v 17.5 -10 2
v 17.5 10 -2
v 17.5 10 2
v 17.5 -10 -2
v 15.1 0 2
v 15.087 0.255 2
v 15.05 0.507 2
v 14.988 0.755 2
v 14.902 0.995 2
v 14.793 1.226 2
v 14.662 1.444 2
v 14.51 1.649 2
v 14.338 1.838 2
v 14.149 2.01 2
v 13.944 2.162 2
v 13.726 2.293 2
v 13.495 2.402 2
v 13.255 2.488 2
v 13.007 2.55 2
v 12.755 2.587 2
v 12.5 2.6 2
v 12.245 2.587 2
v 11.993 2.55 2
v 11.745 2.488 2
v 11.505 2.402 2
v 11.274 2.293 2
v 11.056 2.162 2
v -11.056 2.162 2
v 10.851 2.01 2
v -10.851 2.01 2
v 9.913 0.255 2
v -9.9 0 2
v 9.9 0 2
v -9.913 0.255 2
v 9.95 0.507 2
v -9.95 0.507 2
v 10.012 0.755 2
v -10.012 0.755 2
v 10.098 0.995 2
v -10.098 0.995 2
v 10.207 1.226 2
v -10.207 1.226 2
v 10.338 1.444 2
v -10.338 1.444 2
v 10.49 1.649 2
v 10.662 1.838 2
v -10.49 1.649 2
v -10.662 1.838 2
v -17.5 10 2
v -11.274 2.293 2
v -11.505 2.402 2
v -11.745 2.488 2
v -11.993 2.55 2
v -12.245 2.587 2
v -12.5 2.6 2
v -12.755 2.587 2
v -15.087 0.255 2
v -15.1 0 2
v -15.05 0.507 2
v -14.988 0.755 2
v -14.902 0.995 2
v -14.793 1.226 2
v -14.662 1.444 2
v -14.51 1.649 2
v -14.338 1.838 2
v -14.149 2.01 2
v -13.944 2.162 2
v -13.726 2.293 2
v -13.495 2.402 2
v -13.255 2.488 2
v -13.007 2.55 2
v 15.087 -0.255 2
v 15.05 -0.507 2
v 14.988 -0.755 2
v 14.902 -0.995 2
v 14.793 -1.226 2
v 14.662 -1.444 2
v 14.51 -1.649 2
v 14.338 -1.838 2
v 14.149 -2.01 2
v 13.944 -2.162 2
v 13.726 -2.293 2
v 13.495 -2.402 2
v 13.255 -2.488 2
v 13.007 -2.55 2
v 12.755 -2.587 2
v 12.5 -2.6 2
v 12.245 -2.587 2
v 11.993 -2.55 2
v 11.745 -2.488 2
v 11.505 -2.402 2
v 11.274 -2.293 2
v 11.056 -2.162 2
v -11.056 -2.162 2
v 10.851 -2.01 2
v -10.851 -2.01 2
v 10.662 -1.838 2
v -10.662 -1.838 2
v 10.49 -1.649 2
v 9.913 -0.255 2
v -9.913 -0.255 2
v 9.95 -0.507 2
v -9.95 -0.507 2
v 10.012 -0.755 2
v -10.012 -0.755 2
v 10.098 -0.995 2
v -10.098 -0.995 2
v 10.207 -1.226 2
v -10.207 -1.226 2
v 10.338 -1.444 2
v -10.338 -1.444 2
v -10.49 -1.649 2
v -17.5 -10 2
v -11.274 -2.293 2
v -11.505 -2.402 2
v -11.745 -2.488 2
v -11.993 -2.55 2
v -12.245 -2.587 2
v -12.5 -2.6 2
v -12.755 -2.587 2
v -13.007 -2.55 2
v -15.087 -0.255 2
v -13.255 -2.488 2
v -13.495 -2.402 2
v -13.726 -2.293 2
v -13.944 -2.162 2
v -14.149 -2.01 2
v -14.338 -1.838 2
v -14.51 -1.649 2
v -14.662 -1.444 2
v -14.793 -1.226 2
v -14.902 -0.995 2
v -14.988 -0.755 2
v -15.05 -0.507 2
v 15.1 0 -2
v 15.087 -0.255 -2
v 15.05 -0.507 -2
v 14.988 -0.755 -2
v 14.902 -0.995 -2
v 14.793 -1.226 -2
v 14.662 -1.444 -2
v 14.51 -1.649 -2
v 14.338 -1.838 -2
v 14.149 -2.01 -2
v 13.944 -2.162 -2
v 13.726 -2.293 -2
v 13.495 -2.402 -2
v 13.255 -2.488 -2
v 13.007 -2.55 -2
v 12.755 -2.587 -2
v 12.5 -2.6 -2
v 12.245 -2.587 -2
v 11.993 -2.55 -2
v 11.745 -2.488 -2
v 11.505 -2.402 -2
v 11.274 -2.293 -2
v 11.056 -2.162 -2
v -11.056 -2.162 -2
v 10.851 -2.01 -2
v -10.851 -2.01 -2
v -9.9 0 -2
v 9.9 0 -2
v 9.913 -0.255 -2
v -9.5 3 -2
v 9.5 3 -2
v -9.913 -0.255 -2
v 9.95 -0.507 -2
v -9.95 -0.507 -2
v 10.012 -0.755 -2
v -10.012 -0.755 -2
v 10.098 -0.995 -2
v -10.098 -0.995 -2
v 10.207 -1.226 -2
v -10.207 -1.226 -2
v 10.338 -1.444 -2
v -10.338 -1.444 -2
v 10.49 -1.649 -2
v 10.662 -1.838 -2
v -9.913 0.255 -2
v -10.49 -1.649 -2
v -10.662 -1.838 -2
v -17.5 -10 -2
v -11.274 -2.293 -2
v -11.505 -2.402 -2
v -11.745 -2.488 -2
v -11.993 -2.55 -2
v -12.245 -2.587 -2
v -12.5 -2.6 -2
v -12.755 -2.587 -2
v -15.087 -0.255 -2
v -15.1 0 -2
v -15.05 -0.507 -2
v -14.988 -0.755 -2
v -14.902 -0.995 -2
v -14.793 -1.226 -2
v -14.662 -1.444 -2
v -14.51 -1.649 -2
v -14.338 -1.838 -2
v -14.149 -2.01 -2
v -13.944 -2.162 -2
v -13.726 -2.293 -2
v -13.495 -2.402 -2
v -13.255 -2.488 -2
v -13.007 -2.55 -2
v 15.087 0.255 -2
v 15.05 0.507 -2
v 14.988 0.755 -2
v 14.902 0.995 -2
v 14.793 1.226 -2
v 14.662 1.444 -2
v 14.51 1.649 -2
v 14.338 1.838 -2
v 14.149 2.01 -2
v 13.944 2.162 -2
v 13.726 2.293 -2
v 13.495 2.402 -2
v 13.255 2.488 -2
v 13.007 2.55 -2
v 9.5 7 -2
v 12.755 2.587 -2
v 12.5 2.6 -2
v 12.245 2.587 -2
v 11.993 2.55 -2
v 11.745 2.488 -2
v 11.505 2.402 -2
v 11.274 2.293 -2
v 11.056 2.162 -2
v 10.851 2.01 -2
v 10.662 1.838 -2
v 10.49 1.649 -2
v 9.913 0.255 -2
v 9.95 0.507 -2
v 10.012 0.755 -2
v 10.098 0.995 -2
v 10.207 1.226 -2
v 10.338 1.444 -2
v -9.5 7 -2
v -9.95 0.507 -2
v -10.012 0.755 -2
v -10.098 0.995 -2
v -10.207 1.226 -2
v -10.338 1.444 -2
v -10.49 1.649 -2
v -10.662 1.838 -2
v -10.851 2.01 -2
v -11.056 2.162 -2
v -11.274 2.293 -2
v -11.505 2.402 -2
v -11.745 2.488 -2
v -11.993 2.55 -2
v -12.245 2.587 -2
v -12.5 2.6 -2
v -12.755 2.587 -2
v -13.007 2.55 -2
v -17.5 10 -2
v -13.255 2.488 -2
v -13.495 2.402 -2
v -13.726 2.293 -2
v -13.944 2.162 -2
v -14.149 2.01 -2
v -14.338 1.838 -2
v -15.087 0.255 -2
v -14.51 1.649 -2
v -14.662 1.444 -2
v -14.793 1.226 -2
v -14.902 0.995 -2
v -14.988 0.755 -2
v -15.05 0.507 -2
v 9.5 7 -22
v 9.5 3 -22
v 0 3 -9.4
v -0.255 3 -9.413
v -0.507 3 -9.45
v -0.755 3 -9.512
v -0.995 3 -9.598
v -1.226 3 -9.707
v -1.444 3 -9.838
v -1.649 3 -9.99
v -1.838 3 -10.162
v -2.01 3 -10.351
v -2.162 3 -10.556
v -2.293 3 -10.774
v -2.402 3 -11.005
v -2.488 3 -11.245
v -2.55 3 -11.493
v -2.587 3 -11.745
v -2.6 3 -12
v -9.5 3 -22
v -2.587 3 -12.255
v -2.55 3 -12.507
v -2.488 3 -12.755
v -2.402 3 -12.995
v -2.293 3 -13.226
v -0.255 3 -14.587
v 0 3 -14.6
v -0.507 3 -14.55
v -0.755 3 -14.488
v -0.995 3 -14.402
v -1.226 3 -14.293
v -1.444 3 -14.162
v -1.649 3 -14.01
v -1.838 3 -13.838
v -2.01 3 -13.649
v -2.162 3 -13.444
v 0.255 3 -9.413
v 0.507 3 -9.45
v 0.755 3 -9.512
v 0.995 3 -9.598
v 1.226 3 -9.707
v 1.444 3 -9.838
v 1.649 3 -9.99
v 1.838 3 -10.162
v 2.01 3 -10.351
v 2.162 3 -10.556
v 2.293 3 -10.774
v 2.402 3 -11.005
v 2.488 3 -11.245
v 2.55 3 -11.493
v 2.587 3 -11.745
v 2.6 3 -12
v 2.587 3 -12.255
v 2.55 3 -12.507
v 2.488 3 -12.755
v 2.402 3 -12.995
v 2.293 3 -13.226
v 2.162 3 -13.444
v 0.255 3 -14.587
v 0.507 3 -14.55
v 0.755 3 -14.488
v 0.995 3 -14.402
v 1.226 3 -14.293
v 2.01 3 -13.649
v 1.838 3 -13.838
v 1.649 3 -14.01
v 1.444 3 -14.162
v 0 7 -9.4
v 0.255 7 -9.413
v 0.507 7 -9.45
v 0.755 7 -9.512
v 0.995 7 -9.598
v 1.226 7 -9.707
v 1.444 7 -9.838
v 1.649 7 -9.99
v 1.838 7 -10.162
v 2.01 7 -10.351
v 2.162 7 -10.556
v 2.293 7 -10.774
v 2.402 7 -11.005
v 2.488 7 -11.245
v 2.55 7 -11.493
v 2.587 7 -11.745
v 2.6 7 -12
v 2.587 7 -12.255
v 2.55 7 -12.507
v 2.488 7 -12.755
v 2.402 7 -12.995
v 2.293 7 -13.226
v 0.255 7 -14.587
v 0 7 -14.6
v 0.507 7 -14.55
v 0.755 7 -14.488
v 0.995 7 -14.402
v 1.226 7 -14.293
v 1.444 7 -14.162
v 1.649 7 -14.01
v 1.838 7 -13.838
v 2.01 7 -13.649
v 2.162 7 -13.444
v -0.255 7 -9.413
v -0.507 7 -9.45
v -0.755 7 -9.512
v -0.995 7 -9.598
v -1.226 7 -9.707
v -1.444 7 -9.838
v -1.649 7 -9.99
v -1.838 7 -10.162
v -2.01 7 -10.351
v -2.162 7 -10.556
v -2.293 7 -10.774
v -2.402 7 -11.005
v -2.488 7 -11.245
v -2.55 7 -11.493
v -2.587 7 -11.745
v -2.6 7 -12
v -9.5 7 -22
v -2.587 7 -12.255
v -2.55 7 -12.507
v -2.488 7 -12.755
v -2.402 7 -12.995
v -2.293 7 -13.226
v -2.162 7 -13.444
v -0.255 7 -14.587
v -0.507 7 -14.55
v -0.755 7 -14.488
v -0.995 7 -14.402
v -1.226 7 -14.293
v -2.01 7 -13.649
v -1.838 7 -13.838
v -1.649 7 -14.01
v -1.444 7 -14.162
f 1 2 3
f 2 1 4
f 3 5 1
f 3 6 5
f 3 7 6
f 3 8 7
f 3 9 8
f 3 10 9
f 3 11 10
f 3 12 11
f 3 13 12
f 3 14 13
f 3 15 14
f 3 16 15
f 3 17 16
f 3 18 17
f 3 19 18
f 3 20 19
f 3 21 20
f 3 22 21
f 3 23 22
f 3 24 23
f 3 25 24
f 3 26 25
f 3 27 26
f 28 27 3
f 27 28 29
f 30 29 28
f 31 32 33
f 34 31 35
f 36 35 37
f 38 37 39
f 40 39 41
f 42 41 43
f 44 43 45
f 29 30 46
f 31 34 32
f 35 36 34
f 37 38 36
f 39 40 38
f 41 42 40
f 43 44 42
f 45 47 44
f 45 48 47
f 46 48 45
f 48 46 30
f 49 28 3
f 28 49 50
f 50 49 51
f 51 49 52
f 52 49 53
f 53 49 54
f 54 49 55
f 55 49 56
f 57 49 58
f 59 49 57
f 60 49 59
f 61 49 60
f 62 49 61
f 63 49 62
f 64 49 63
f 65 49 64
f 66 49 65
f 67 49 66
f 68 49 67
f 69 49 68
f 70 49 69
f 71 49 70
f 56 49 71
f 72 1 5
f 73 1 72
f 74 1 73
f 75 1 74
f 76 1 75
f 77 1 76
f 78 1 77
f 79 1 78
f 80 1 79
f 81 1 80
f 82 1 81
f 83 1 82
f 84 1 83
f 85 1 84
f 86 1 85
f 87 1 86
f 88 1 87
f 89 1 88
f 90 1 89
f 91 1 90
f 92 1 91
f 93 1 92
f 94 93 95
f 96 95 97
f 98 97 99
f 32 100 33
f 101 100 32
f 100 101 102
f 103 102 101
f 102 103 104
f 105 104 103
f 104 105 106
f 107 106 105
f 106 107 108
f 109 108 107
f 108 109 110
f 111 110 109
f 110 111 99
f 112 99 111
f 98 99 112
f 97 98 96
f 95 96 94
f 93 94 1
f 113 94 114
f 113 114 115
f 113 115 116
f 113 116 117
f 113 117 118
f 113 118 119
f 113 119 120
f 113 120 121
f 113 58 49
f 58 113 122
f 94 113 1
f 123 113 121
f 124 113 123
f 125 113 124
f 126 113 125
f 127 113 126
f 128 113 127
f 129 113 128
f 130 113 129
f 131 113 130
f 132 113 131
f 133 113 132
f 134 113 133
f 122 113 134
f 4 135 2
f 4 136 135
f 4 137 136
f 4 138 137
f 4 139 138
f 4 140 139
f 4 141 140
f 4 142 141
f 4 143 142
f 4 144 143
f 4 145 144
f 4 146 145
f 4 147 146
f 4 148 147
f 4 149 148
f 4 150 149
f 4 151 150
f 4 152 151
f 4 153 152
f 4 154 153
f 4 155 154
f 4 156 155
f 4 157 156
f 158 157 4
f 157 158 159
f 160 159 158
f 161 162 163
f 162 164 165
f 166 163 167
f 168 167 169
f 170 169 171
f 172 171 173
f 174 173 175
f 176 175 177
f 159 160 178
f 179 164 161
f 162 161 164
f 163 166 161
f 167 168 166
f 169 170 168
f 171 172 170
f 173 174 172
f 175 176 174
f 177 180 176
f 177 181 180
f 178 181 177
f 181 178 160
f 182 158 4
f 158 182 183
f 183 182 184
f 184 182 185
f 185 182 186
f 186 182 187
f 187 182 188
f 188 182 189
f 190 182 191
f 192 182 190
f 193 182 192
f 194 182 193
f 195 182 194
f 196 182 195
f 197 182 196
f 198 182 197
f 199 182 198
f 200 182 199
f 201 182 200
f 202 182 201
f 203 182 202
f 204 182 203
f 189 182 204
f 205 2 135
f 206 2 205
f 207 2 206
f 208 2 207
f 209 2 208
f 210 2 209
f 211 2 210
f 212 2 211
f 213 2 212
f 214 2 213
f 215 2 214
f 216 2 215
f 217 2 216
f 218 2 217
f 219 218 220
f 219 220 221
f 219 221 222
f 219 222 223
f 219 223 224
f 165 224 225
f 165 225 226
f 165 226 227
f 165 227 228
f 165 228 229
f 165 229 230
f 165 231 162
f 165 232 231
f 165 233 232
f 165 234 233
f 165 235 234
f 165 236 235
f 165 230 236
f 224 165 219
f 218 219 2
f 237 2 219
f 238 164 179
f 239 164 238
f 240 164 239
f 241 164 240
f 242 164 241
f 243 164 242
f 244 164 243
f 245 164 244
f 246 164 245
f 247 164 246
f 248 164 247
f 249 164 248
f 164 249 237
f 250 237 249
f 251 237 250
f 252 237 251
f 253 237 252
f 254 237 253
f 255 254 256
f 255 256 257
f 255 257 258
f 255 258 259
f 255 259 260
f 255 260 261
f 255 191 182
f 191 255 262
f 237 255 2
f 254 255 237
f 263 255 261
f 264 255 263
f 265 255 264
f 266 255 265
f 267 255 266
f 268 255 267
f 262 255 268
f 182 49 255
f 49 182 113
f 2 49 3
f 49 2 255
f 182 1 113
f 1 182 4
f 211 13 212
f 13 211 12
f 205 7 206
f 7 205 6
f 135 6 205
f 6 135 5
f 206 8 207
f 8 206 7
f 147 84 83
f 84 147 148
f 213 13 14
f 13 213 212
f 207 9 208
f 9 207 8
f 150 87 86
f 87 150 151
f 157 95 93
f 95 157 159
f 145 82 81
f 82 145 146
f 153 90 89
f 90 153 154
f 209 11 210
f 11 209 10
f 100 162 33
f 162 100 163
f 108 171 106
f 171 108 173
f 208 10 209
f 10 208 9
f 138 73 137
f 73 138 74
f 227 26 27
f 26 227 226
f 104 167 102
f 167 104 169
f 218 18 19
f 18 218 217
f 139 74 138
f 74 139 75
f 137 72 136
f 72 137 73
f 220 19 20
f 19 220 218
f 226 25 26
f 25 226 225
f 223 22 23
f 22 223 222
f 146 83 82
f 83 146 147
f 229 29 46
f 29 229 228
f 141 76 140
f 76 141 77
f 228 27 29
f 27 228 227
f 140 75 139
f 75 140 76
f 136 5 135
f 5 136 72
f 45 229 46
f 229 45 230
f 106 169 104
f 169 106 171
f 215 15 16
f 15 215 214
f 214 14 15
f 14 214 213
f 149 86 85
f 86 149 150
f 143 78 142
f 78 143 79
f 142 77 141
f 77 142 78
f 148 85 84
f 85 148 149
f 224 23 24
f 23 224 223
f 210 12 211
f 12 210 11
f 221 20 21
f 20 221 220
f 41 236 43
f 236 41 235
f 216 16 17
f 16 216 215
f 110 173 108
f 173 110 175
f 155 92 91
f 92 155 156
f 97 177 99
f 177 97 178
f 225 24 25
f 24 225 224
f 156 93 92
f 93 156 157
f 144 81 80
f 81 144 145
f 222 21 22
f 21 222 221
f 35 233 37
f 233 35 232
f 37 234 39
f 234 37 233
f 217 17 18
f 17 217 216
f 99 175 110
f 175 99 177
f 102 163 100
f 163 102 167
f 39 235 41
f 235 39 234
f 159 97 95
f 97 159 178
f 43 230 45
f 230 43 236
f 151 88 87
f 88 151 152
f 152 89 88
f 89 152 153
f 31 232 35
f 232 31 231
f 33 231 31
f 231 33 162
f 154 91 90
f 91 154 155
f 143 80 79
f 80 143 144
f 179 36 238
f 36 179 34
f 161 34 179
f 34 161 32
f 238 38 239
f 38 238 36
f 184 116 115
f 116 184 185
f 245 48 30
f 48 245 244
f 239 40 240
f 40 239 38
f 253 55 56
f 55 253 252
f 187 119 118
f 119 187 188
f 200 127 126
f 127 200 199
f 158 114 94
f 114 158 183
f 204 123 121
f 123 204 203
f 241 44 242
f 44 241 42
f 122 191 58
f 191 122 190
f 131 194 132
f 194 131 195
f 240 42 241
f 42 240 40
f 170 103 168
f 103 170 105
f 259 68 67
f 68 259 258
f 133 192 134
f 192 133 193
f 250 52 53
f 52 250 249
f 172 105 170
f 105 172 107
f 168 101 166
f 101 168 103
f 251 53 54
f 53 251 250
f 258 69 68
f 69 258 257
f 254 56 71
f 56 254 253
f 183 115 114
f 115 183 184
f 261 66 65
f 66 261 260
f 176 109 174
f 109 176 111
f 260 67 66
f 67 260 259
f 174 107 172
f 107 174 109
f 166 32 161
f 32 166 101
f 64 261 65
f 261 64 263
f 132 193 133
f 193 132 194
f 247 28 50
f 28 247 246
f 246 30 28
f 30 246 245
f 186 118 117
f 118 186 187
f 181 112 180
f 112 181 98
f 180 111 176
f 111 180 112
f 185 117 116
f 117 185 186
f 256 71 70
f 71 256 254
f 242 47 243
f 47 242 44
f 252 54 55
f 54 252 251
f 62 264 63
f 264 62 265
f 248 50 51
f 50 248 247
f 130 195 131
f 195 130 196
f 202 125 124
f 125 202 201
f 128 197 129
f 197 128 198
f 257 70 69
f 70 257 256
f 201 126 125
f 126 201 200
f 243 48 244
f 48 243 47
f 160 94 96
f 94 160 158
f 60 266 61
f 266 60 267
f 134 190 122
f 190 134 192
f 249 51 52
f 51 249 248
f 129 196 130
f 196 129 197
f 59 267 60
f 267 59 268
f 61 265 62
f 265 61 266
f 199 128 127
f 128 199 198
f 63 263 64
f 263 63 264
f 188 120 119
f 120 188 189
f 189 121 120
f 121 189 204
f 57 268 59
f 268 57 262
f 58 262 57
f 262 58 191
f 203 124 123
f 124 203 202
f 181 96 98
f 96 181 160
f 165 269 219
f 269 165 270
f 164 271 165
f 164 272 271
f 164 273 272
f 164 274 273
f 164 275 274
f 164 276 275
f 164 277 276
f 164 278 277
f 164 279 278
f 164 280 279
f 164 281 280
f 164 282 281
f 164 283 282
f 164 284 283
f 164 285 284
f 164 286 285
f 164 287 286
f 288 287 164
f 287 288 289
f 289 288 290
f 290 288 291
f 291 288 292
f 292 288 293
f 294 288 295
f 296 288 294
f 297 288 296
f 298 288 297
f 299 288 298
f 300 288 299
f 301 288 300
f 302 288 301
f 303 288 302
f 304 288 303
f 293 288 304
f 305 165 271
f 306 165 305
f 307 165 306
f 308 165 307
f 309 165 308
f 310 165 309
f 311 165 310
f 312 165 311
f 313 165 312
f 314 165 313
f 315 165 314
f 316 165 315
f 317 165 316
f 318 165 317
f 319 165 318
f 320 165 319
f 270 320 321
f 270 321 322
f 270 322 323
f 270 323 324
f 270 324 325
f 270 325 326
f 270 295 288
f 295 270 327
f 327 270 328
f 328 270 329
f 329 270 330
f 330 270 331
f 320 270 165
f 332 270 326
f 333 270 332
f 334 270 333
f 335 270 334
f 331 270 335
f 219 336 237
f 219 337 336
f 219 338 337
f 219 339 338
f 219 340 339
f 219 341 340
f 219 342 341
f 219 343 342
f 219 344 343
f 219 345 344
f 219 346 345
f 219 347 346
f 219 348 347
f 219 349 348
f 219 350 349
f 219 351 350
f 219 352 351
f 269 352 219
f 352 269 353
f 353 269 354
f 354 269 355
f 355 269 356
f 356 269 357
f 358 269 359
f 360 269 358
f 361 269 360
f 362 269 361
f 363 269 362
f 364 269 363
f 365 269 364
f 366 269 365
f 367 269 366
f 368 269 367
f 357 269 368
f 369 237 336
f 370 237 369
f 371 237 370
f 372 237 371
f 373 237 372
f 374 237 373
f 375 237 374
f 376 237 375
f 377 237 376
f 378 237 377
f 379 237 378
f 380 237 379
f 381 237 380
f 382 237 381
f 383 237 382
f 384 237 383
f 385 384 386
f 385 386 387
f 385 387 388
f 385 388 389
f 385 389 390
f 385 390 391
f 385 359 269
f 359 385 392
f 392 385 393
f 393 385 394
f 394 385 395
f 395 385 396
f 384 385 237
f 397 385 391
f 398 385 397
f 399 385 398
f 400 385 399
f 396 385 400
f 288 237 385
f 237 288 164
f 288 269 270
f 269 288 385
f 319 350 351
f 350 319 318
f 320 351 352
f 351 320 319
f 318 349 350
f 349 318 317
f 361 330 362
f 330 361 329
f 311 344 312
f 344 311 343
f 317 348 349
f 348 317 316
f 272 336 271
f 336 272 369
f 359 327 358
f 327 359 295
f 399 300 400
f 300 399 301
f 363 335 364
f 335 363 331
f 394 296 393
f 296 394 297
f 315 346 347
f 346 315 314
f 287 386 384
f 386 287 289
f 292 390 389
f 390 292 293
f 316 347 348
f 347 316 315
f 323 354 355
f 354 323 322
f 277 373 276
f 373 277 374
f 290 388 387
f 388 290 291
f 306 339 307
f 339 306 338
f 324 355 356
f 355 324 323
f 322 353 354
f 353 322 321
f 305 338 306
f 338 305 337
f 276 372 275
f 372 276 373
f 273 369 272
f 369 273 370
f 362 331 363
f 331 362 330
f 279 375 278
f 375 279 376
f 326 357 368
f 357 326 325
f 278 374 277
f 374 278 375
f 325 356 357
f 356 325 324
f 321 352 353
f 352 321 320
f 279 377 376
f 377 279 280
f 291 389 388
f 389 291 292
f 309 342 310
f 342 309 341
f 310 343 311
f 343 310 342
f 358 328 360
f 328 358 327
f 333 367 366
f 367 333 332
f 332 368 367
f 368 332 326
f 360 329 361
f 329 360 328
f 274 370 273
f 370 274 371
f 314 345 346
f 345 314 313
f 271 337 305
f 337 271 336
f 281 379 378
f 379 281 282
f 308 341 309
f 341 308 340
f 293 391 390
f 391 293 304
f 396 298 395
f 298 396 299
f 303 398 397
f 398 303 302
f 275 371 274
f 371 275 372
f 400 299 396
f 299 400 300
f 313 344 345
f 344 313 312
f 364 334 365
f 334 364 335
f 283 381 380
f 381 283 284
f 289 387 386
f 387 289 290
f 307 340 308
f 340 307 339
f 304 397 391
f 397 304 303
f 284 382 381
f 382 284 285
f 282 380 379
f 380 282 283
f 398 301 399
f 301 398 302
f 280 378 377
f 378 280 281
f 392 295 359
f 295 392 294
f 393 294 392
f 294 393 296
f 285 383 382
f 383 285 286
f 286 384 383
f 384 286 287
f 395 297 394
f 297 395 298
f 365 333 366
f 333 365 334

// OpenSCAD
$fn = 64;
in = 25.4;

// --- Parameters ---
ball_radius = 100;         // ball joint distance from center (KINEMATICS-critical)
bolt_radius = 115;         // M5 bolt holes - outboard, near the edge
plate_thickness = 6.35;    // 1/4" acrylic
m5_clearance = 2.6;        // 5.2mm holes for M5 hardware
bolt_pair_spacing = 25;    // tangential spacing between the 2 bolts at each station
edge_margin = 12;          // plate material past the bolt holes


difference(){
    
    cube([bolt_pair_spacing+10,20,4],center=true);
    translate([bolt_pair_spacing/2,0,-5]) 
    cylinder(10,m5_clearance,m5_clearance);
    translate([-bolt_pair_spacing/2,0,-5]) 
    cylinder(10,m5_clearance,m5_clearance);
}

translate([0,5,-12])
rotate([90,0,0])
difference(){
    cube([19,20,4],center=true);
    translate([0,0,-5]) 
    cylinder(10,m5_clearance,m5_clearance);
}
